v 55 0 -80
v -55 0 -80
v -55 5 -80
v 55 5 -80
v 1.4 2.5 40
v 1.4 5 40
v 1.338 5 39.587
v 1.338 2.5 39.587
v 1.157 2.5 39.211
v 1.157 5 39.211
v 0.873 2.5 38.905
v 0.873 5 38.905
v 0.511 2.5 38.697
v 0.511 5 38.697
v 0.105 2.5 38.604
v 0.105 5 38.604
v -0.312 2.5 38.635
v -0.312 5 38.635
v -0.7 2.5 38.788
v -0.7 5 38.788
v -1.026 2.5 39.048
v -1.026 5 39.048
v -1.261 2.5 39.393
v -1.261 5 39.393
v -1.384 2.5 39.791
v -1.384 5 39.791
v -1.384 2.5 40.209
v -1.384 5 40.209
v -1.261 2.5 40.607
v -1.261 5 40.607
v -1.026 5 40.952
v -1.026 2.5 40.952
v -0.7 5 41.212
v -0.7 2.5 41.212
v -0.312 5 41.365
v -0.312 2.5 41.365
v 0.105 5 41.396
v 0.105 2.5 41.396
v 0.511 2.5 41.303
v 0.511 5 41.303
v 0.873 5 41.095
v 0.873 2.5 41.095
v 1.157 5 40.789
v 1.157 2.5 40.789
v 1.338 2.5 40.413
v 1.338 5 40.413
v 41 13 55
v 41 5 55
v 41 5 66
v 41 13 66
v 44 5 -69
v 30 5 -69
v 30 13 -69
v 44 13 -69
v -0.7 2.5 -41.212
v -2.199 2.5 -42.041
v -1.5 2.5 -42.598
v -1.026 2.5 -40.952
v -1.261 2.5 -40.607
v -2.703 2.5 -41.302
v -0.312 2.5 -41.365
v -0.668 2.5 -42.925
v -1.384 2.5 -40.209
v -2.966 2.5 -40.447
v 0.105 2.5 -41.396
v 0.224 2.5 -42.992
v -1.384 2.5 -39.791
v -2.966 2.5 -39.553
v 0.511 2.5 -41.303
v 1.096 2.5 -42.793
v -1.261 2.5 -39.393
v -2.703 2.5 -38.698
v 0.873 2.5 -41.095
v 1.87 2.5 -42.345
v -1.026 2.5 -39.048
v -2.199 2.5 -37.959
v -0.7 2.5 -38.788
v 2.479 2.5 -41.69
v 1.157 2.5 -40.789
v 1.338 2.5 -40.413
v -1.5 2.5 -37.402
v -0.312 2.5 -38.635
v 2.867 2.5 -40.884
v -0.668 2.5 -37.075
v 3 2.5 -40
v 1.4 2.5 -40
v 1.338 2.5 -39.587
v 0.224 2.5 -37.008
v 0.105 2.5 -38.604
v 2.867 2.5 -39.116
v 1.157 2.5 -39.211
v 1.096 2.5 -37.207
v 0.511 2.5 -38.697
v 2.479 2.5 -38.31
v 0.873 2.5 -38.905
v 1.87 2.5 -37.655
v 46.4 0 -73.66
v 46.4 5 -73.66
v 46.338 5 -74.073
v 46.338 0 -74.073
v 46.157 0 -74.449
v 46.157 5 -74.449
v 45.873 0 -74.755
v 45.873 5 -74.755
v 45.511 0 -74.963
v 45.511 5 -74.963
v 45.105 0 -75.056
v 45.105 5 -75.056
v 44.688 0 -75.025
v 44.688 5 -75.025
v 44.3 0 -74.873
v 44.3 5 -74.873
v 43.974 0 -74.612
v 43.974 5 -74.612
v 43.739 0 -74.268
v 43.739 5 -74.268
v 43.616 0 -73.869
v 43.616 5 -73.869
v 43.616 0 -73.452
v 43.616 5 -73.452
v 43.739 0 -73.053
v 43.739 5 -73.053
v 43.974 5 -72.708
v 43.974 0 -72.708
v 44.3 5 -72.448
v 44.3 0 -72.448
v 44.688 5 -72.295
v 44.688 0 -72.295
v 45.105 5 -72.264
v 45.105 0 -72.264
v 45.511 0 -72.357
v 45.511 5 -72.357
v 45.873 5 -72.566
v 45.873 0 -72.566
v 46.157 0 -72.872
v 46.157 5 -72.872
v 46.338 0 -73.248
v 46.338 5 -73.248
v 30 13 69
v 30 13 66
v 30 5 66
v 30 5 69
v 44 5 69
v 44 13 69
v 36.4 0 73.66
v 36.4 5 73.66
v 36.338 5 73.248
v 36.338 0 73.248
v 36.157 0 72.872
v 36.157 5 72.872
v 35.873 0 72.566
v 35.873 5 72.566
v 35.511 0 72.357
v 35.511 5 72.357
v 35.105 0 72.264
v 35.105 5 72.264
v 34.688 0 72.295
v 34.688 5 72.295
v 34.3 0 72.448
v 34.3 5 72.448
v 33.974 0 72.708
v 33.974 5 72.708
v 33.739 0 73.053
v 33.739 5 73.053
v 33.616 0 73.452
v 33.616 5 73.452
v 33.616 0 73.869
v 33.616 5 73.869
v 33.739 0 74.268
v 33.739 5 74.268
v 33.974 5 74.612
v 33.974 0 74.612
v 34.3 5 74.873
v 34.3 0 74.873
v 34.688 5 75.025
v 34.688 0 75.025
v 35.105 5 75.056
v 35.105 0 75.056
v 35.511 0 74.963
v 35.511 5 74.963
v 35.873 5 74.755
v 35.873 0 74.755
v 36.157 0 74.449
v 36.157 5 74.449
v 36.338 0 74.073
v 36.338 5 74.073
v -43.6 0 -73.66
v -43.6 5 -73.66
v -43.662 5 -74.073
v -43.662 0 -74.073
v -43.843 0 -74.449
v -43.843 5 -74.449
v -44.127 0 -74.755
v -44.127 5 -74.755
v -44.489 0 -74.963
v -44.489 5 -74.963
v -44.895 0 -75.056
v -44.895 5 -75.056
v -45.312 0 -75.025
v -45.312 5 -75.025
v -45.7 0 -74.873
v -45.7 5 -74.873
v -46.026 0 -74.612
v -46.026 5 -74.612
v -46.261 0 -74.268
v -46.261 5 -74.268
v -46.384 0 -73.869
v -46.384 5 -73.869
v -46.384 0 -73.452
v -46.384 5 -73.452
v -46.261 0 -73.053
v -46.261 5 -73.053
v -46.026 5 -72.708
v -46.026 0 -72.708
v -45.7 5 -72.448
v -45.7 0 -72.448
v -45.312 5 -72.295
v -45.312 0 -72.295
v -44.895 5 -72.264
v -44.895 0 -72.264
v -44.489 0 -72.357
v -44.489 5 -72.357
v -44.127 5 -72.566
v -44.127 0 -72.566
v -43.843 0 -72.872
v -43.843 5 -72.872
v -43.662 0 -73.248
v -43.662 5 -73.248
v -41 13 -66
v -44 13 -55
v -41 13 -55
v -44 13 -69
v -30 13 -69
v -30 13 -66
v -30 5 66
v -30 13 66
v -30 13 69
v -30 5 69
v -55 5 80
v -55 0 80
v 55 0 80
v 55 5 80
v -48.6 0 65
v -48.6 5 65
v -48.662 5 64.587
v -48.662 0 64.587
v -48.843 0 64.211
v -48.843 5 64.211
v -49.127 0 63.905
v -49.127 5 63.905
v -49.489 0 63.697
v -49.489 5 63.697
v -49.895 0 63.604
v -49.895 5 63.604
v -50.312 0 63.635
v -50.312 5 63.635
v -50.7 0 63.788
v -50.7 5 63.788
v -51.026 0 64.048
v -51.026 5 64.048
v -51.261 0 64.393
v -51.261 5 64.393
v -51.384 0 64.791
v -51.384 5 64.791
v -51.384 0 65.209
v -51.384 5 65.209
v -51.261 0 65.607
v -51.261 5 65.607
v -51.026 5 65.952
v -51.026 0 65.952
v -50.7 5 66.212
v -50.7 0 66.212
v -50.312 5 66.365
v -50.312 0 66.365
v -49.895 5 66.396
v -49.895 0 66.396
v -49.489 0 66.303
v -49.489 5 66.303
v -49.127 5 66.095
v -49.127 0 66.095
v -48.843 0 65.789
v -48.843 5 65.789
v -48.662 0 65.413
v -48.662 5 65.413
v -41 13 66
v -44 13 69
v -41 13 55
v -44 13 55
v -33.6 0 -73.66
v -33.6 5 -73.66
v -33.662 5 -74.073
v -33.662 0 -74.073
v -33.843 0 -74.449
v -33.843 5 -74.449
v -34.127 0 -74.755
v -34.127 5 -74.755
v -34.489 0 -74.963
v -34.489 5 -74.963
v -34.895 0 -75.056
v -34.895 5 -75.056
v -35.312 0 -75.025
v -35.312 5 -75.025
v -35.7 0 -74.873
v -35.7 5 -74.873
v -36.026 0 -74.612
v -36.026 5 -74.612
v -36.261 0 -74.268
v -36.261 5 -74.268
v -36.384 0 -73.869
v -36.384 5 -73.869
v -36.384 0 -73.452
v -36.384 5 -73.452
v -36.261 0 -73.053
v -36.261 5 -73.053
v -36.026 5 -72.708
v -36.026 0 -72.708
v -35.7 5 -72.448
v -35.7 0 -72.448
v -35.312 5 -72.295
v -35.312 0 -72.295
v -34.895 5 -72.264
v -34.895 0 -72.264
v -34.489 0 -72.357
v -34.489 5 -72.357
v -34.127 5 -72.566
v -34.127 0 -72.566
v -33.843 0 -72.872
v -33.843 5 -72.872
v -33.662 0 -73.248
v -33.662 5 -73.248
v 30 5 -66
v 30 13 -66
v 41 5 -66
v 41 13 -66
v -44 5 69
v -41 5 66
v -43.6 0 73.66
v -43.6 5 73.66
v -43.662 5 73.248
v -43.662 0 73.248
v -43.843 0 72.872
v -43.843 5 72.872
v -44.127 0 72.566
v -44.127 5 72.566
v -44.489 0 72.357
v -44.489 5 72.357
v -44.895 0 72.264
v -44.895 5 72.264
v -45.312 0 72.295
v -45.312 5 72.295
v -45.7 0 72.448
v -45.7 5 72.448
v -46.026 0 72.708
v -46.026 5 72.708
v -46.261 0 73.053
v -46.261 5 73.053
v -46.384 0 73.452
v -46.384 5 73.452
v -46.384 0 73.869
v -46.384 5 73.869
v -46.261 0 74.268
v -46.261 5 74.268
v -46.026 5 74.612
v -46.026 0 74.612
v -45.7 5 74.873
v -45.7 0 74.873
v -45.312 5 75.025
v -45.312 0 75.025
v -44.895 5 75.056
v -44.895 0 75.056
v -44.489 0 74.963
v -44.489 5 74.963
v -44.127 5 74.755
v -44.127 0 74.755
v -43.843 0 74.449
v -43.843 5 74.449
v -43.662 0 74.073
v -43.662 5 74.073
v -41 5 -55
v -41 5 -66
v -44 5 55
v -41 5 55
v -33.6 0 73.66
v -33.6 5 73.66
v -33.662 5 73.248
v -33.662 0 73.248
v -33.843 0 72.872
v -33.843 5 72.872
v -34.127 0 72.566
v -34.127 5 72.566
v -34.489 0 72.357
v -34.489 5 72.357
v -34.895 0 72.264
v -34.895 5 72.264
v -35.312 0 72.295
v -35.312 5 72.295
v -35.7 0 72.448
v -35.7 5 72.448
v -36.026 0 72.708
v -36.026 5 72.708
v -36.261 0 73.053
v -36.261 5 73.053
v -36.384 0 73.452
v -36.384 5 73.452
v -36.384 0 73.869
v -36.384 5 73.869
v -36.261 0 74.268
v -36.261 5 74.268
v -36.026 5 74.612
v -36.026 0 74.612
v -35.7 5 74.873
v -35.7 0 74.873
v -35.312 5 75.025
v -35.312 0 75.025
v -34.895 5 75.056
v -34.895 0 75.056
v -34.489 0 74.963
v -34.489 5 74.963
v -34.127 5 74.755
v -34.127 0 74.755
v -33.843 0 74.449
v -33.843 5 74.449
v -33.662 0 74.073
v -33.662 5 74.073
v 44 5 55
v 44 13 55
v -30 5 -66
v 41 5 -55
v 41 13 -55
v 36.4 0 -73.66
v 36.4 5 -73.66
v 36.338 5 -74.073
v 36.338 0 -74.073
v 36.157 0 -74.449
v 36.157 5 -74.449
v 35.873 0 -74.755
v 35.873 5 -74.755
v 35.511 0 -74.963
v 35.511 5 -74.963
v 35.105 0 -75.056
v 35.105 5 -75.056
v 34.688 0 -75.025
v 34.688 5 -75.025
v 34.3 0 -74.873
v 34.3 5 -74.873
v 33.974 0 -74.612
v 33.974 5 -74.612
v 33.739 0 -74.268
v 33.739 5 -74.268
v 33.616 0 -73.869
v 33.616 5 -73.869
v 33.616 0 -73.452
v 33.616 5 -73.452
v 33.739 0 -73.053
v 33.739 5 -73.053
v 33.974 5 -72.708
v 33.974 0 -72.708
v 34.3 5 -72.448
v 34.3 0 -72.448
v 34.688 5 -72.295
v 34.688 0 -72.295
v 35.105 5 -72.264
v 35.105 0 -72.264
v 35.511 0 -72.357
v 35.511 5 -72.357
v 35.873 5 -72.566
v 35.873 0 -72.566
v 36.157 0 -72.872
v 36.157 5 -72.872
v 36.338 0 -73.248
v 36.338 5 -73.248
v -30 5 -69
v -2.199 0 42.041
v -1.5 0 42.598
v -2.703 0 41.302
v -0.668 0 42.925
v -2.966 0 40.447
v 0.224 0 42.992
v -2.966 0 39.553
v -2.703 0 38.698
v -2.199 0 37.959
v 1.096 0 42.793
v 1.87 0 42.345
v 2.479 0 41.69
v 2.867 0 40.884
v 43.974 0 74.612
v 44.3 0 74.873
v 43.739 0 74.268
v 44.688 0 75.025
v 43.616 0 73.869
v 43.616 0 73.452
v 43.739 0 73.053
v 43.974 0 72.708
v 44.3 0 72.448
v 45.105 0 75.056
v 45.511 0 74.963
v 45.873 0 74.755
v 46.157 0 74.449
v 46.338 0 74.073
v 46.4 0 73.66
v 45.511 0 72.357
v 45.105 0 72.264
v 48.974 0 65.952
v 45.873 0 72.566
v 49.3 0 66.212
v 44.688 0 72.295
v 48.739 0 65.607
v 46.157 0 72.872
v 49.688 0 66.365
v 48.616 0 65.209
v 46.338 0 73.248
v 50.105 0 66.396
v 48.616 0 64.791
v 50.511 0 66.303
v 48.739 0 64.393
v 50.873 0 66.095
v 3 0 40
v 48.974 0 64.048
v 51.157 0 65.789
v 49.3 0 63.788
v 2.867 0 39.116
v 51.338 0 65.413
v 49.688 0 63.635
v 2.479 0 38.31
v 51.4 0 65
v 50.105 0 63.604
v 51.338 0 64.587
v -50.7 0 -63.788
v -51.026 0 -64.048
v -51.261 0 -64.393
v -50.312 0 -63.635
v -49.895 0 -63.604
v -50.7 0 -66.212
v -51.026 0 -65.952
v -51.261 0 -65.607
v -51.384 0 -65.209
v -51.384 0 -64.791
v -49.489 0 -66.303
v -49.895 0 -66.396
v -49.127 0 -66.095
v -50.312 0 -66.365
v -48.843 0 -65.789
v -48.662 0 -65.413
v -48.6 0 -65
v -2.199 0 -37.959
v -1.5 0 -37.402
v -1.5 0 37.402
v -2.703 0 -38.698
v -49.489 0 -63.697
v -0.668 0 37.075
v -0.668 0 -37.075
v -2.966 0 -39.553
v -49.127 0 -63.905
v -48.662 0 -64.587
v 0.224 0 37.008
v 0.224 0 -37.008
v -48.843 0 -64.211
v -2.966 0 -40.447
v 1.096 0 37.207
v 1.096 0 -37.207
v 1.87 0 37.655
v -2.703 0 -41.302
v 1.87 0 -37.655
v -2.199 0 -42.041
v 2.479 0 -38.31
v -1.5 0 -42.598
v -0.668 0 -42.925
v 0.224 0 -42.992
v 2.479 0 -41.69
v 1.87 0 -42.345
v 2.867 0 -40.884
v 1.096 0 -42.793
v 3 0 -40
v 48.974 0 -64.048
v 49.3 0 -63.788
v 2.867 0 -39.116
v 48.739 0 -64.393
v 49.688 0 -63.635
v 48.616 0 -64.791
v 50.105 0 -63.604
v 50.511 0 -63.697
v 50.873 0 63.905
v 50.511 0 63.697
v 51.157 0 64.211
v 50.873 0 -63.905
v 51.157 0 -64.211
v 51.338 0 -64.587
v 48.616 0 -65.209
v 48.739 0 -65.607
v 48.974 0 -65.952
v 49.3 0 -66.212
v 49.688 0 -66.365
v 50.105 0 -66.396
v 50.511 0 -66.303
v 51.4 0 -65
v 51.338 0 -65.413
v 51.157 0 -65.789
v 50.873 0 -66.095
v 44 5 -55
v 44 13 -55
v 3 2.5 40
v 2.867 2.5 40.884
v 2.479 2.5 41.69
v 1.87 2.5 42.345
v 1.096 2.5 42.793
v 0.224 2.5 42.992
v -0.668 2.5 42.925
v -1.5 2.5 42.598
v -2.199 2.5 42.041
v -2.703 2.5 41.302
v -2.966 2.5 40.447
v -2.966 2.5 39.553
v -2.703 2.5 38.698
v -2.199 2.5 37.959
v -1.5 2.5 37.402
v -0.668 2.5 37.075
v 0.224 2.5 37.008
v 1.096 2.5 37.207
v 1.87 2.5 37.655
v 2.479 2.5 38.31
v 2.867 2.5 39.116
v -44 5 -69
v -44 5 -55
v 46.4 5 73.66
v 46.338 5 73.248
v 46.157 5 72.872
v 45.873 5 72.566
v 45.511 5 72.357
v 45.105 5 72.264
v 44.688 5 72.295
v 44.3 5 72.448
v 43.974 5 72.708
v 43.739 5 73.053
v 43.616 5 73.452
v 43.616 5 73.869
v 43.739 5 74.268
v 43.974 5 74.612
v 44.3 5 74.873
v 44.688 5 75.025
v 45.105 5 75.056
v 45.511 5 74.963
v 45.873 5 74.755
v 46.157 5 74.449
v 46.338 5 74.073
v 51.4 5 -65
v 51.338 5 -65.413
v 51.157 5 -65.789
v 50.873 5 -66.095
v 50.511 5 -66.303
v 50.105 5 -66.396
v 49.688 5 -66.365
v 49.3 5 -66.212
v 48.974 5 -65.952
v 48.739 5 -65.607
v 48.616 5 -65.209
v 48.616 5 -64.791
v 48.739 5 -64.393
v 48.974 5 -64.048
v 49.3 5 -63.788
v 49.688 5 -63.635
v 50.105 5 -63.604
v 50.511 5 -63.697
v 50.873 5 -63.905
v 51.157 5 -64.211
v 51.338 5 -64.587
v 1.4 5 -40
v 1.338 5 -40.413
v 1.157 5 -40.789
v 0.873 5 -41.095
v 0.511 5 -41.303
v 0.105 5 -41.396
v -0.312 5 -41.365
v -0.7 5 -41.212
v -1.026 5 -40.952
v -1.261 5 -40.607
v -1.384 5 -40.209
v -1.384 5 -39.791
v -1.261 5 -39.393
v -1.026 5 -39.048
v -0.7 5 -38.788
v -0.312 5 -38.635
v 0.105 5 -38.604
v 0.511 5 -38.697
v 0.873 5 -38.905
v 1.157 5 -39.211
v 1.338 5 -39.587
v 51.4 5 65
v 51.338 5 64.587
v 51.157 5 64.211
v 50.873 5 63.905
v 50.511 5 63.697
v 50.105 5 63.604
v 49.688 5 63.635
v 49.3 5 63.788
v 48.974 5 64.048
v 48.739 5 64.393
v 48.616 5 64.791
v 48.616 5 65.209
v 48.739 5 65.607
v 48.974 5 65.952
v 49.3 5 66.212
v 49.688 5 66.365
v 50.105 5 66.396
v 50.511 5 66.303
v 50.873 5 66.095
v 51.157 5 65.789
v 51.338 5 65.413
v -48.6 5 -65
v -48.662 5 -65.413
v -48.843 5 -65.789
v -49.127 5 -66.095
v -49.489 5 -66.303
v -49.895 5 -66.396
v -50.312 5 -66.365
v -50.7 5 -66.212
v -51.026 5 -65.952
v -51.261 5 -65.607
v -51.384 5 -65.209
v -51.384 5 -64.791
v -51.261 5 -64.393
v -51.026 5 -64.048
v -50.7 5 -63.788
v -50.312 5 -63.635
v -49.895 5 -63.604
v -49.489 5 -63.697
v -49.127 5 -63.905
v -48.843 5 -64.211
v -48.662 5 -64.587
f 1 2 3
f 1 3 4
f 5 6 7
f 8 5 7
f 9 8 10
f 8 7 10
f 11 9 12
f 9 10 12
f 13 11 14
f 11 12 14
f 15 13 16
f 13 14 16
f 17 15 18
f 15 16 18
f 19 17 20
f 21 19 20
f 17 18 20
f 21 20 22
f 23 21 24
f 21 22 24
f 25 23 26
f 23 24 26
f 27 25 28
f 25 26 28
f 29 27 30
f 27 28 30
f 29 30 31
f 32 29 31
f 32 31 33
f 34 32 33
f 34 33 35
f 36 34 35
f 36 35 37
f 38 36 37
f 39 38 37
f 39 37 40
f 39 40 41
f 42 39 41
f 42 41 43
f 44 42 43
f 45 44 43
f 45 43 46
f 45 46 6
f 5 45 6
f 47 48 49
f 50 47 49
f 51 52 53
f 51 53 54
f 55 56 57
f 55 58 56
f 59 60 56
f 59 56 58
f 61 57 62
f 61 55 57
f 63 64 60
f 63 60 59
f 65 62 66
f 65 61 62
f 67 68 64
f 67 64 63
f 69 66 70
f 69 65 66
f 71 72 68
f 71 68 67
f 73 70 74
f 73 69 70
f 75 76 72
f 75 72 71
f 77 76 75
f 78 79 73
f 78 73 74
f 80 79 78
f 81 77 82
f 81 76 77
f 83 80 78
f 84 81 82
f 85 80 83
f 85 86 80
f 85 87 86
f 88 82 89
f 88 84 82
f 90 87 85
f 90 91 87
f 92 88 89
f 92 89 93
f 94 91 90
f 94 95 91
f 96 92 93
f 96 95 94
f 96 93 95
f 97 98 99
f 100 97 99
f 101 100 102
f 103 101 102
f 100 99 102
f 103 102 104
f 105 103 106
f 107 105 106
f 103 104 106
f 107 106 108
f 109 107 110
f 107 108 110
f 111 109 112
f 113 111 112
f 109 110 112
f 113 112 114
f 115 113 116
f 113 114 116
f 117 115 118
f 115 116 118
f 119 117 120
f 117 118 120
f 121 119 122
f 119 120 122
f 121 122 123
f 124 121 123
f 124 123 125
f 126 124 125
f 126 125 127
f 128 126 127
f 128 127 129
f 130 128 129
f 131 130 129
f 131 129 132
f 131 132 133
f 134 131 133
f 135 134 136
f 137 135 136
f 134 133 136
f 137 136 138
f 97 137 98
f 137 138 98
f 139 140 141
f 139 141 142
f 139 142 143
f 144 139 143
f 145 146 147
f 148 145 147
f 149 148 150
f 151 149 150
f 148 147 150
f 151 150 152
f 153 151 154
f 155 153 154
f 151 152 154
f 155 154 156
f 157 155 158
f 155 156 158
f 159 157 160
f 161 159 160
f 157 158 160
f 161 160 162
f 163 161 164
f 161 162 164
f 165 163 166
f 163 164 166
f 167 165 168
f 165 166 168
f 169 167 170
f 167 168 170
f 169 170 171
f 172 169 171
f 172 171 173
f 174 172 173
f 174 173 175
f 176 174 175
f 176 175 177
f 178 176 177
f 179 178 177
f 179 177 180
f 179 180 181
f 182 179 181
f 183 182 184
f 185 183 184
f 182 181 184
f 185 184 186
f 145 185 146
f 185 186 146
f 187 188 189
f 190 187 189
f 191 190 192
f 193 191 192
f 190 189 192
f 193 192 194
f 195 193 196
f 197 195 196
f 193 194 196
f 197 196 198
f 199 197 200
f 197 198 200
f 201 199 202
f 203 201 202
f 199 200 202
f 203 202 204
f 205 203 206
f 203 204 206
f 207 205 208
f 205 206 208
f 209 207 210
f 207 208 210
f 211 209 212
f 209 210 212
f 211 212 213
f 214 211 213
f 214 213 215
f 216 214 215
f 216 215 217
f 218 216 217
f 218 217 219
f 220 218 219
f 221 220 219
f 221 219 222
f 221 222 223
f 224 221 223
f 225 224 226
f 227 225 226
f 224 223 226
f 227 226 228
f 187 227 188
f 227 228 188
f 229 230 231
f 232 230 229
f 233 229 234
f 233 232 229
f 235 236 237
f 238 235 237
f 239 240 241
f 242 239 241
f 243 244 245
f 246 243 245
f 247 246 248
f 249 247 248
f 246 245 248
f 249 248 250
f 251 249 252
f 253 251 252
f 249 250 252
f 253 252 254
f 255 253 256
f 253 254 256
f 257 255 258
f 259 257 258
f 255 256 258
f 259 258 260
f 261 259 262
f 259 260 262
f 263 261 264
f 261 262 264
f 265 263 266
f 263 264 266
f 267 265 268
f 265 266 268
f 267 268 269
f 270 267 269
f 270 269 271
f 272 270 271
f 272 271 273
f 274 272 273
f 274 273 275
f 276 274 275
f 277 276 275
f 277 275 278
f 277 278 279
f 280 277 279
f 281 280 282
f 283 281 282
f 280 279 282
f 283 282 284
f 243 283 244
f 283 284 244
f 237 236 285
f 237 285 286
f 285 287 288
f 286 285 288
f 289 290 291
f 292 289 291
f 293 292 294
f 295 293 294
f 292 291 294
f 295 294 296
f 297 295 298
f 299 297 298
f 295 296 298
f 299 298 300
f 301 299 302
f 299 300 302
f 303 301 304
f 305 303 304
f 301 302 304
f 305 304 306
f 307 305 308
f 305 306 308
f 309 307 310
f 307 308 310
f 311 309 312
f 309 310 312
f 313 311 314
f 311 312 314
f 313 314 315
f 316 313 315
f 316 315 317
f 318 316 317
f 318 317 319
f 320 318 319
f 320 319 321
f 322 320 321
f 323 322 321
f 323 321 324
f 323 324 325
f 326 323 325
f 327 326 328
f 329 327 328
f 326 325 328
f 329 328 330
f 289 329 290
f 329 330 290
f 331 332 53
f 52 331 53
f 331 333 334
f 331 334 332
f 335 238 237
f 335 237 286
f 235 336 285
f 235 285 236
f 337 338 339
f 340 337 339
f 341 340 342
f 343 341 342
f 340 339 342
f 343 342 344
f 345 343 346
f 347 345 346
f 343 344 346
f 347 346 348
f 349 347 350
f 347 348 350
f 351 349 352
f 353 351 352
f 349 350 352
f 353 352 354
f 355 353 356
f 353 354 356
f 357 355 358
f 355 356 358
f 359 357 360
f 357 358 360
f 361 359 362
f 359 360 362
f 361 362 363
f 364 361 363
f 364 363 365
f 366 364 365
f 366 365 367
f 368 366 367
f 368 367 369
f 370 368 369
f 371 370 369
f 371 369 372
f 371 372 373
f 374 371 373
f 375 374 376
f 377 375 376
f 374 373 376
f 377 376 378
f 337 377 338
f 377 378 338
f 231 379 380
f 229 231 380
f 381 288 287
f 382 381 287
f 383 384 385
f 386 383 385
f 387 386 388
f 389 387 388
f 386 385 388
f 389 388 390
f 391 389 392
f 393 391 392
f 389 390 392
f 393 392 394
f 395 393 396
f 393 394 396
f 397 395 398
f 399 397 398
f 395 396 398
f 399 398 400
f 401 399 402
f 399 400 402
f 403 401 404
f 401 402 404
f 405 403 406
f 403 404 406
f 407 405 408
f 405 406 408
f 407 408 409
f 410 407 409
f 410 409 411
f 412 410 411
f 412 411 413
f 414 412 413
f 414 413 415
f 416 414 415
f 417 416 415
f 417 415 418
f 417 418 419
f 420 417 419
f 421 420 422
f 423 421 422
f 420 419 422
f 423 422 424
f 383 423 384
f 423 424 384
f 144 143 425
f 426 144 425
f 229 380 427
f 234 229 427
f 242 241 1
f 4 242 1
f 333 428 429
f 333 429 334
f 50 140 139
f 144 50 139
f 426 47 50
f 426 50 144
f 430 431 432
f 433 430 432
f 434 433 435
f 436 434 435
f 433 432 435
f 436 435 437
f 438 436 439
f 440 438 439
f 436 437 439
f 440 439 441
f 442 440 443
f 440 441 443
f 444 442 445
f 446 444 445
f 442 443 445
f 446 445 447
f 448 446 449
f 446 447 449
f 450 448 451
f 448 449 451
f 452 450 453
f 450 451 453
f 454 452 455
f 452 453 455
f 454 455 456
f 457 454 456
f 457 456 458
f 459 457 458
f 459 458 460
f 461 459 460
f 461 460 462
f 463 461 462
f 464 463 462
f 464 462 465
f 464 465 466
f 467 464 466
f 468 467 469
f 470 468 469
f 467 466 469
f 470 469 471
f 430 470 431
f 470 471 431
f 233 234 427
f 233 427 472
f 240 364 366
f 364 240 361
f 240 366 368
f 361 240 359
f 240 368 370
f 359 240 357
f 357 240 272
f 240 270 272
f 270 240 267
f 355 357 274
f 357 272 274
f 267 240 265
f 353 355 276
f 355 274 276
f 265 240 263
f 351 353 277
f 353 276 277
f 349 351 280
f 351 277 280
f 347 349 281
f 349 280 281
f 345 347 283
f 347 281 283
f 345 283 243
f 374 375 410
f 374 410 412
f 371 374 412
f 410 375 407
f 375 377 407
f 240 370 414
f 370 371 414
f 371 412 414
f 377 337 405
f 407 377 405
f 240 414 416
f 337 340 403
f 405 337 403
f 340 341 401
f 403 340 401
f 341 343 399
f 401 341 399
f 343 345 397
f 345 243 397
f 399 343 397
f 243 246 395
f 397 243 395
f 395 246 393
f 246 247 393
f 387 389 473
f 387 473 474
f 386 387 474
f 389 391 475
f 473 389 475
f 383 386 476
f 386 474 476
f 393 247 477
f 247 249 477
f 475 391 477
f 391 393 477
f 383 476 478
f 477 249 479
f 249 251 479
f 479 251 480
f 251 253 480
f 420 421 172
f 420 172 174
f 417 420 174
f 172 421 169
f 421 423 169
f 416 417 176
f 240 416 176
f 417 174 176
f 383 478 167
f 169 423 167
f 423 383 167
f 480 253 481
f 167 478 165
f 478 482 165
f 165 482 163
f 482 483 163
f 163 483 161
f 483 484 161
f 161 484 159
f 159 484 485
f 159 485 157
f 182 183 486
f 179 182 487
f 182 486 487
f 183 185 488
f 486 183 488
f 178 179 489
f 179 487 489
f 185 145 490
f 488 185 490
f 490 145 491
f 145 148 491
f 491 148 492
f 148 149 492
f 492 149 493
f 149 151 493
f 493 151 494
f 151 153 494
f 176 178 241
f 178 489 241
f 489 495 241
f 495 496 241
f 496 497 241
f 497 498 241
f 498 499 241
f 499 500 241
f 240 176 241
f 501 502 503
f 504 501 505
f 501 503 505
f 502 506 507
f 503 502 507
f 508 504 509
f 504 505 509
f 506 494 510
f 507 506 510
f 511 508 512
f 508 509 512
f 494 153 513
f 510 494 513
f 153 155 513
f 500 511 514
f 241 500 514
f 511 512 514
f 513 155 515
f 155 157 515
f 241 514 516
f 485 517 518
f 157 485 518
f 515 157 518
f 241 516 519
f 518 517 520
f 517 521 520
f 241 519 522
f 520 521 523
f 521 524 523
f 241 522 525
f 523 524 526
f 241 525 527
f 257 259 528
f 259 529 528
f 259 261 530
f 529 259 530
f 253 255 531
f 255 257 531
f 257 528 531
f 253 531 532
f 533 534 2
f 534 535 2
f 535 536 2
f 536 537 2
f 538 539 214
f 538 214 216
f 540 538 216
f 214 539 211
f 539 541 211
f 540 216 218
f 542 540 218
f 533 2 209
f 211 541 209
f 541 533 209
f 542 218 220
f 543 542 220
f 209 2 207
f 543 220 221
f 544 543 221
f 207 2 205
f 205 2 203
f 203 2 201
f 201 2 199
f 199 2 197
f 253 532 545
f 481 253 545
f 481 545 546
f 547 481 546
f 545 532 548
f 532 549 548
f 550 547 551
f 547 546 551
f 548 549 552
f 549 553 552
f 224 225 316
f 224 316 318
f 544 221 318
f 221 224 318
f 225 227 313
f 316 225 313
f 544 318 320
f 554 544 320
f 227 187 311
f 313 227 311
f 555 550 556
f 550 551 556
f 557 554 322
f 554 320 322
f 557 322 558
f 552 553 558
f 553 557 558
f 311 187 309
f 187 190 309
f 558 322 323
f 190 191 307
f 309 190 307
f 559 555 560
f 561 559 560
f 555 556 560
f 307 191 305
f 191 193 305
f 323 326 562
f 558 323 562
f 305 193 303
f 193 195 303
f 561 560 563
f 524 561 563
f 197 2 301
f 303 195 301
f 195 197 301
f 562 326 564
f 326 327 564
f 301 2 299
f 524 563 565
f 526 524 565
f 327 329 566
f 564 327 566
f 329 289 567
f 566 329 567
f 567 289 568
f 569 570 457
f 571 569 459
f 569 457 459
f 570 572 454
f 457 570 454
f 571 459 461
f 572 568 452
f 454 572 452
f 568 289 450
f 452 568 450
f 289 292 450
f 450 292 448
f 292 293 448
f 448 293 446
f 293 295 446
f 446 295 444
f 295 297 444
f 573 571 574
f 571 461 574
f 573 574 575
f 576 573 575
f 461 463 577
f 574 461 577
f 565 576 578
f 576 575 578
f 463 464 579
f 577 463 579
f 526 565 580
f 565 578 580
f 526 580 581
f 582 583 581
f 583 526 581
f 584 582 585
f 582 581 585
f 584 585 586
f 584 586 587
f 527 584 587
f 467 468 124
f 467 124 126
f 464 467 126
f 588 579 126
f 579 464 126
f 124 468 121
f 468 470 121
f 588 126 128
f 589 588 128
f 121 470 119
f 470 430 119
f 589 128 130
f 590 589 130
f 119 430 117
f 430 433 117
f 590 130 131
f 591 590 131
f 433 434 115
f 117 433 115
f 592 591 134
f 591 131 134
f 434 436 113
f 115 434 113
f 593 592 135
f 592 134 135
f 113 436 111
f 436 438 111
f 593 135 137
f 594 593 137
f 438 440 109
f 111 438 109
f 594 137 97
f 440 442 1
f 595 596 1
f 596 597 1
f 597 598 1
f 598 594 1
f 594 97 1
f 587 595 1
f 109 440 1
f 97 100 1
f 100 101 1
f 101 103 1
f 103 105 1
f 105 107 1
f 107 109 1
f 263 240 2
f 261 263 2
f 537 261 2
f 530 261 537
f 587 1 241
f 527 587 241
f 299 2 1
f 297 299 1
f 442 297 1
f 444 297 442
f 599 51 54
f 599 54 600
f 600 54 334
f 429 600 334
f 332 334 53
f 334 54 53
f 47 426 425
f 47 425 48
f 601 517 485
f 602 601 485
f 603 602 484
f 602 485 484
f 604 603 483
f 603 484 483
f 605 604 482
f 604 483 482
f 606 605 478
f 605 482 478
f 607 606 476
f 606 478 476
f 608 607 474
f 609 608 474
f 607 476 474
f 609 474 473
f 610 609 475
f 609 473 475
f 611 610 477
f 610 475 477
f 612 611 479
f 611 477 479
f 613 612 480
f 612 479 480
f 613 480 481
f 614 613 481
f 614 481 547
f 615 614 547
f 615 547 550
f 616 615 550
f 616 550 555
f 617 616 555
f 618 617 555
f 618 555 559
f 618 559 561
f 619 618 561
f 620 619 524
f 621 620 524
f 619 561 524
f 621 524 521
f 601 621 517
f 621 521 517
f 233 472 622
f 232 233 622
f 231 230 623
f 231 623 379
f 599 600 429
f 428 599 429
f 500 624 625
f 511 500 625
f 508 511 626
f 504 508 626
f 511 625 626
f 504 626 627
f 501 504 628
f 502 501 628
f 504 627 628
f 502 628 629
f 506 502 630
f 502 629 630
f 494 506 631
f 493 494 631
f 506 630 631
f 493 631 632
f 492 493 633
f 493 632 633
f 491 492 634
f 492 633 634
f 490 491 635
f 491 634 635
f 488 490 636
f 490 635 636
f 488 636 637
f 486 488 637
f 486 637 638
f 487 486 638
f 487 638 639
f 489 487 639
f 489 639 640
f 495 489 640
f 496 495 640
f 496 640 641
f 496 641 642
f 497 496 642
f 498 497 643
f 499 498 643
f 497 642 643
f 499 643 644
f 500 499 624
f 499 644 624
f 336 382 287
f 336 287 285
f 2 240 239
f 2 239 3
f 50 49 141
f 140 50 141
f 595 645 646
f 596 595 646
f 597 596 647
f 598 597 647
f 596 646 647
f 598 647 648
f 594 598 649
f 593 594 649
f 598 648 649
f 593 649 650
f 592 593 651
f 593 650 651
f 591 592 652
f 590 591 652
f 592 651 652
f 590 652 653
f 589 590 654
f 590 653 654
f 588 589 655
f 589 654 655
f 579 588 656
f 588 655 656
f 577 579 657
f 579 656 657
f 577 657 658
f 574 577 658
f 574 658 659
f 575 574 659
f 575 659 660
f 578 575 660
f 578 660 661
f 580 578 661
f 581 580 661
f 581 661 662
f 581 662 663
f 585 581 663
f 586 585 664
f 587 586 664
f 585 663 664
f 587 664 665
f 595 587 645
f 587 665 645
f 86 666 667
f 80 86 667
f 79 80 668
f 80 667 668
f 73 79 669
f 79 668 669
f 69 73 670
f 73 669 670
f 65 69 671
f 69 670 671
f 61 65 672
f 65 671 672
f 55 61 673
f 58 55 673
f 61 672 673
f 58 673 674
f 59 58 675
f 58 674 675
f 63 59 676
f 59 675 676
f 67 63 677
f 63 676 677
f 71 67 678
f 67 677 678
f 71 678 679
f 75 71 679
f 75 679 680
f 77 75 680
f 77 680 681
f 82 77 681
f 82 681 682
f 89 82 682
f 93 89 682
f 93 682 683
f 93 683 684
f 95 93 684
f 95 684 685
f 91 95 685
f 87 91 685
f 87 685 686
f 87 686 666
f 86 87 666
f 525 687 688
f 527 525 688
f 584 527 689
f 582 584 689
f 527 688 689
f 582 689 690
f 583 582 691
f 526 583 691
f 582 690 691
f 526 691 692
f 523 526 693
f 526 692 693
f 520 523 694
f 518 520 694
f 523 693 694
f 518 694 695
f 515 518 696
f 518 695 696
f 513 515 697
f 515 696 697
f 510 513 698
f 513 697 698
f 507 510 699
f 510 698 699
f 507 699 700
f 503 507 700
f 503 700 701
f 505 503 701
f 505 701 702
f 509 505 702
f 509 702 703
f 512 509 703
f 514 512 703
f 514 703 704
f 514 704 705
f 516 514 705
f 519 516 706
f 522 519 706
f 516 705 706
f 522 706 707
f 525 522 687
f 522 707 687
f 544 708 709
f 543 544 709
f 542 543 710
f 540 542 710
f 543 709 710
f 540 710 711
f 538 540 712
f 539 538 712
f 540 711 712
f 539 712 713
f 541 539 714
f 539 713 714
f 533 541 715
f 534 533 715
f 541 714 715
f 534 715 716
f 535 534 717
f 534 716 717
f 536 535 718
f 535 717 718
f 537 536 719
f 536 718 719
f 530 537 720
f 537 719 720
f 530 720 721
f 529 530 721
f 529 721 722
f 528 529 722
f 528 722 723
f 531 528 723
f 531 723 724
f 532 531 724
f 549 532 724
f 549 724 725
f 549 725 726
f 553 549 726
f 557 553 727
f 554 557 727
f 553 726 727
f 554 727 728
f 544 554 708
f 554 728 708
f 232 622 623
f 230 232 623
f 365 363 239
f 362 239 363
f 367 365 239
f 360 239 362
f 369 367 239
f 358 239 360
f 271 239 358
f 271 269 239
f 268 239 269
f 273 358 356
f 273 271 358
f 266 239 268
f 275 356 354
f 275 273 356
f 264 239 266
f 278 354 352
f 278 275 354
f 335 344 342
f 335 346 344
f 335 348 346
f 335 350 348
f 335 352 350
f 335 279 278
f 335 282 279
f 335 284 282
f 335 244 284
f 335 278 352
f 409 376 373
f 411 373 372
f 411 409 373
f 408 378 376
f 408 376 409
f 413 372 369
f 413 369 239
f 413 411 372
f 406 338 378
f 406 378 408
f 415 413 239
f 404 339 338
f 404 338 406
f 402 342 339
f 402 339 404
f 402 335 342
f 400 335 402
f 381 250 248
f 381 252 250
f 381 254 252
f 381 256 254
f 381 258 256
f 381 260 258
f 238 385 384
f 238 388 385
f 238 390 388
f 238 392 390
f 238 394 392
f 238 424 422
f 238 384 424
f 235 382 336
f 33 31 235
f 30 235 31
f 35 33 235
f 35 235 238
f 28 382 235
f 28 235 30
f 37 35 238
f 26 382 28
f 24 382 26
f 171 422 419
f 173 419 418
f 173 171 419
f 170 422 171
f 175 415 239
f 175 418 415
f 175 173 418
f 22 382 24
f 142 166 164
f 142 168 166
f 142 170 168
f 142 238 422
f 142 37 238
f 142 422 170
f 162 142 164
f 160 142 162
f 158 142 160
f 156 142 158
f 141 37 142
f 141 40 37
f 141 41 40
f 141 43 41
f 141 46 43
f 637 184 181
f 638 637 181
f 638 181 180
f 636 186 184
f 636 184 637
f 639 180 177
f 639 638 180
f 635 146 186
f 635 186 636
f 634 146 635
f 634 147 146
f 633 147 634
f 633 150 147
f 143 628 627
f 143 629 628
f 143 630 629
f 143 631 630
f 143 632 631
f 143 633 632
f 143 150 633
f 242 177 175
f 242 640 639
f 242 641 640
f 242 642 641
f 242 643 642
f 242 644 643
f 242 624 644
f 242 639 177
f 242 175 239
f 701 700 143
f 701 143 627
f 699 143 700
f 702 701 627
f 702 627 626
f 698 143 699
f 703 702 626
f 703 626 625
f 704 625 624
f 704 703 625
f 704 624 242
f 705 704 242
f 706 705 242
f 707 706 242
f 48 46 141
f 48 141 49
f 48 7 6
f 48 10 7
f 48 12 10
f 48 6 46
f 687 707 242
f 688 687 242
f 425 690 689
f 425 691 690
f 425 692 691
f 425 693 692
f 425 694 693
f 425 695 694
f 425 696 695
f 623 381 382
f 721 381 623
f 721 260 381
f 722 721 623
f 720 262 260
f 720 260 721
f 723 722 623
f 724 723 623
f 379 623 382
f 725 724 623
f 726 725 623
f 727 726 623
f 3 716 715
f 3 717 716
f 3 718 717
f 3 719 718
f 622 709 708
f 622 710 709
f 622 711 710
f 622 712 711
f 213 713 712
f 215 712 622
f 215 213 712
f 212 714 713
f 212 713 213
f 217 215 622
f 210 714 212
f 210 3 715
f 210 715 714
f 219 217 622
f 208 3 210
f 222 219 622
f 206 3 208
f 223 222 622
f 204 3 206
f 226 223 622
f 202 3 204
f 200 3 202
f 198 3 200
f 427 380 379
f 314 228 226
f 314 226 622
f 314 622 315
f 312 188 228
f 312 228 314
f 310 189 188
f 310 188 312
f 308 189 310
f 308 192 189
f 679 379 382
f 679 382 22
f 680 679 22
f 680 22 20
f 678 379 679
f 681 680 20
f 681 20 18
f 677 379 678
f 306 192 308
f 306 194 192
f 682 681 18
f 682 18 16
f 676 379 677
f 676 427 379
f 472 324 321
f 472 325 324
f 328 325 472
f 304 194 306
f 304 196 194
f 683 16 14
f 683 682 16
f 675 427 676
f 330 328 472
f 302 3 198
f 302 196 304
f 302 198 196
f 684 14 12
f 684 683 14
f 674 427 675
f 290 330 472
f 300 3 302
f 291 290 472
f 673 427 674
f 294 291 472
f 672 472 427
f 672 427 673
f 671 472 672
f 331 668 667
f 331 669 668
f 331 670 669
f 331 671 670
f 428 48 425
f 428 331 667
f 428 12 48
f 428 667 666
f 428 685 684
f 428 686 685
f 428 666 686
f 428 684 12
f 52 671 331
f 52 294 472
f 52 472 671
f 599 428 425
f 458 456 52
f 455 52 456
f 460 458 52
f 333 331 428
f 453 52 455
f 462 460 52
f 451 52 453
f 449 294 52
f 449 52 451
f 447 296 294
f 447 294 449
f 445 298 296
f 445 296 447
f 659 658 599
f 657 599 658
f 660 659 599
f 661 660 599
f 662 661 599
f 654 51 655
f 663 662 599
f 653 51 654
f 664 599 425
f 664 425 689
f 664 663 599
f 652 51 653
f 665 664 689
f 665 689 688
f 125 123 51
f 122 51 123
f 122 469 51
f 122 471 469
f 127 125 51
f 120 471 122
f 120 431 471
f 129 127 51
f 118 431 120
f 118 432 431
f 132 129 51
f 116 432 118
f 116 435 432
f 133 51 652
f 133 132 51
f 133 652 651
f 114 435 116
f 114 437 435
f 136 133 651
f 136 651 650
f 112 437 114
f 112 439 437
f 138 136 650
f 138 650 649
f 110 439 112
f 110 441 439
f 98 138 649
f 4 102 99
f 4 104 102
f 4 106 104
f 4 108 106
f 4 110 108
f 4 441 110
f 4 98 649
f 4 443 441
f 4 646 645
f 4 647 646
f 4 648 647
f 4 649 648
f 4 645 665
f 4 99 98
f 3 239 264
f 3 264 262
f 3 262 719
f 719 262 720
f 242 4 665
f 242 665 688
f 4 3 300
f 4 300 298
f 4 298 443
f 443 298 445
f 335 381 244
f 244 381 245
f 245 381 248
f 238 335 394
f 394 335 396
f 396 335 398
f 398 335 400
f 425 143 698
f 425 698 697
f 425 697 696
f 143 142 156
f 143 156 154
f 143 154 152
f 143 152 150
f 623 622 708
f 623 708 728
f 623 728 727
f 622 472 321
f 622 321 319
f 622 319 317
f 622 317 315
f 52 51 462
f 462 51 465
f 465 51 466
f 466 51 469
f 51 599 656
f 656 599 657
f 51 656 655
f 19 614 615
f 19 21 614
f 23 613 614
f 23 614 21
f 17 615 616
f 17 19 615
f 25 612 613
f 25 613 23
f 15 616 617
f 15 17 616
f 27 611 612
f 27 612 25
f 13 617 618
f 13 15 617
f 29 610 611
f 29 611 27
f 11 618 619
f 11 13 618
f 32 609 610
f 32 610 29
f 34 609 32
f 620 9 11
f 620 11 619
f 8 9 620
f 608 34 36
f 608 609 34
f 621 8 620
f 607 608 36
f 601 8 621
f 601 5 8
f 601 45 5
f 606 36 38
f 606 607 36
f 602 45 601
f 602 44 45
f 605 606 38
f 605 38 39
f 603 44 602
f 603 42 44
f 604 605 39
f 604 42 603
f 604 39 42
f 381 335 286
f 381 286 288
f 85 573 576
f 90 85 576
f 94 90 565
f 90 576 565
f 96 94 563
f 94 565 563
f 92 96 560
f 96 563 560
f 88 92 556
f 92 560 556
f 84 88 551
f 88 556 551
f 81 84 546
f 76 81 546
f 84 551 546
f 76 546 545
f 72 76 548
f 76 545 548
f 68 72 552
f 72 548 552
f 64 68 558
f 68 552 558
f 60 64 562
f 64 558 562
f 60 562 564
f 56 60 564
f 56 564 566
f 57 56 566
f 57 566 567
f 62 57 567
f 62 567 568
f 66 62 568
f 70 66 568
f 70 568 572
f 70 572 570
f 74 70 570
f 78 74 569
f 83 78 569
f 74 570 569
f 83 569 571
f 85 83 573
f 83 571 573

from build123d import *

# Parameters (mm, degrees)
SKETCH_1_W          = 110
SKETCH_1_H          = 160
EXTRUDE_1_DEPTH     = 5
SKETCH_3_R          = 1.4
CUT_EXTRUDE_1_DEPTH = 5
EXTRUDE_2_DEPTH     = 8
SKETCH_5_R          = 3
CUT_EXTRUDE_2_DEPTH = 2.5


with BuildPart() as part:
    # 스케치1 → 보스-돌출1 (new body)
    with BuildSketch(Plane(origin=(0, 0, 0), x_dir=(1, 0, 0), z_dir=(0, 1, 0))):
        Rectangle(SKETCH_1_W, SKETCH_1_H)
    extrude(amount=EXTRUDE_1_DEPTH)

    # 스케치3 → 컷-돌출1 (cut)
    with BuildSketch(Plane(origin=(0, 5, 0), x_dir=(1, 0, 0), z_dir=(0, 1, 0))):
        with Locations((-50, 65)):
            Circle(SKETCH_3_R)
        with Locations((-45, 73.660254038)):
            Circle(SKETCH_3_R)
        with Locations((-35, 73.660254038)):
            Circle(SKETCH_3_R)
        with Locations((-50, -65)):
            Circle(SKETCH_3_R)
        with Locations((-45, -73.660254038)):
            Circle(SKETCH_3_R)
        with Locations((-35, -73.660254038)):
            Circle(SKETCH_3_R)
        with Locations((35, 73.660254038)):
            Circle(SKETCH_3_R)
        with Locations((45, 73.660254038)):
            Circle(SKETCH_3_R)
        with Locations((50, 65)):
            Circle(SKETCH_3_R)
        with Locations((35, -73.660254038)):
            Circle(SKETCH_3_R)
        with Locations((45, -73.660254038)):
            Circle(SKETCH_3_R)
        with Locations((50, -65)):
            Circle(SKETCH_3_R)
        with Locations((0, 40)):
            Circle(SKETCH_3_R)
        with Locations((0, -40)):
            Circle(SKETCH_3_R)
    extrude(amount=-CUT_EXTRUDE_1_DEPTH, mode=Mode.SUBTRACT)

    # 스케치4 → 보스-돌출2 (add)
    with BuildSketch(Plane(origin=(0, 5, 0), x_dir=(1, 0, 0), z_dir=(0, 1, 0))):
        Polygon((41, 66), (30, 66), (30, 69), (44, 69), (44, 55), (41, 55), align=None)
        Polygon((44, -55), (41, -55), (41, -66), (30, -66), (30, -69), (44, -69), align=None)
        Polygon((-44, 55), (-41, 55), (-41, 66), (-30, 66), (-30, 69), (-44, 69), align=None)
        Polygon((-44, -55), (-41, -55), (-41, -66), (-30, -66), (-30, -69), (-44, -69), align=None)
    extrude(amount=EXTRUDE_2_DEPTH)

    # 스케치5 → 컷-돌출2 (cut)
    with BuildSketch(Plane.XZ):
        with Locations((0, 40)):
            Circle(SKETCH_5_R)
        with Locations((0, -40)):
            Circle(SKETCH_5_R)
    extrude(amount=-CUT_EXTRUDE_2_DEPTH, mode=Mode.SUBTRACT)


solid = part.part
